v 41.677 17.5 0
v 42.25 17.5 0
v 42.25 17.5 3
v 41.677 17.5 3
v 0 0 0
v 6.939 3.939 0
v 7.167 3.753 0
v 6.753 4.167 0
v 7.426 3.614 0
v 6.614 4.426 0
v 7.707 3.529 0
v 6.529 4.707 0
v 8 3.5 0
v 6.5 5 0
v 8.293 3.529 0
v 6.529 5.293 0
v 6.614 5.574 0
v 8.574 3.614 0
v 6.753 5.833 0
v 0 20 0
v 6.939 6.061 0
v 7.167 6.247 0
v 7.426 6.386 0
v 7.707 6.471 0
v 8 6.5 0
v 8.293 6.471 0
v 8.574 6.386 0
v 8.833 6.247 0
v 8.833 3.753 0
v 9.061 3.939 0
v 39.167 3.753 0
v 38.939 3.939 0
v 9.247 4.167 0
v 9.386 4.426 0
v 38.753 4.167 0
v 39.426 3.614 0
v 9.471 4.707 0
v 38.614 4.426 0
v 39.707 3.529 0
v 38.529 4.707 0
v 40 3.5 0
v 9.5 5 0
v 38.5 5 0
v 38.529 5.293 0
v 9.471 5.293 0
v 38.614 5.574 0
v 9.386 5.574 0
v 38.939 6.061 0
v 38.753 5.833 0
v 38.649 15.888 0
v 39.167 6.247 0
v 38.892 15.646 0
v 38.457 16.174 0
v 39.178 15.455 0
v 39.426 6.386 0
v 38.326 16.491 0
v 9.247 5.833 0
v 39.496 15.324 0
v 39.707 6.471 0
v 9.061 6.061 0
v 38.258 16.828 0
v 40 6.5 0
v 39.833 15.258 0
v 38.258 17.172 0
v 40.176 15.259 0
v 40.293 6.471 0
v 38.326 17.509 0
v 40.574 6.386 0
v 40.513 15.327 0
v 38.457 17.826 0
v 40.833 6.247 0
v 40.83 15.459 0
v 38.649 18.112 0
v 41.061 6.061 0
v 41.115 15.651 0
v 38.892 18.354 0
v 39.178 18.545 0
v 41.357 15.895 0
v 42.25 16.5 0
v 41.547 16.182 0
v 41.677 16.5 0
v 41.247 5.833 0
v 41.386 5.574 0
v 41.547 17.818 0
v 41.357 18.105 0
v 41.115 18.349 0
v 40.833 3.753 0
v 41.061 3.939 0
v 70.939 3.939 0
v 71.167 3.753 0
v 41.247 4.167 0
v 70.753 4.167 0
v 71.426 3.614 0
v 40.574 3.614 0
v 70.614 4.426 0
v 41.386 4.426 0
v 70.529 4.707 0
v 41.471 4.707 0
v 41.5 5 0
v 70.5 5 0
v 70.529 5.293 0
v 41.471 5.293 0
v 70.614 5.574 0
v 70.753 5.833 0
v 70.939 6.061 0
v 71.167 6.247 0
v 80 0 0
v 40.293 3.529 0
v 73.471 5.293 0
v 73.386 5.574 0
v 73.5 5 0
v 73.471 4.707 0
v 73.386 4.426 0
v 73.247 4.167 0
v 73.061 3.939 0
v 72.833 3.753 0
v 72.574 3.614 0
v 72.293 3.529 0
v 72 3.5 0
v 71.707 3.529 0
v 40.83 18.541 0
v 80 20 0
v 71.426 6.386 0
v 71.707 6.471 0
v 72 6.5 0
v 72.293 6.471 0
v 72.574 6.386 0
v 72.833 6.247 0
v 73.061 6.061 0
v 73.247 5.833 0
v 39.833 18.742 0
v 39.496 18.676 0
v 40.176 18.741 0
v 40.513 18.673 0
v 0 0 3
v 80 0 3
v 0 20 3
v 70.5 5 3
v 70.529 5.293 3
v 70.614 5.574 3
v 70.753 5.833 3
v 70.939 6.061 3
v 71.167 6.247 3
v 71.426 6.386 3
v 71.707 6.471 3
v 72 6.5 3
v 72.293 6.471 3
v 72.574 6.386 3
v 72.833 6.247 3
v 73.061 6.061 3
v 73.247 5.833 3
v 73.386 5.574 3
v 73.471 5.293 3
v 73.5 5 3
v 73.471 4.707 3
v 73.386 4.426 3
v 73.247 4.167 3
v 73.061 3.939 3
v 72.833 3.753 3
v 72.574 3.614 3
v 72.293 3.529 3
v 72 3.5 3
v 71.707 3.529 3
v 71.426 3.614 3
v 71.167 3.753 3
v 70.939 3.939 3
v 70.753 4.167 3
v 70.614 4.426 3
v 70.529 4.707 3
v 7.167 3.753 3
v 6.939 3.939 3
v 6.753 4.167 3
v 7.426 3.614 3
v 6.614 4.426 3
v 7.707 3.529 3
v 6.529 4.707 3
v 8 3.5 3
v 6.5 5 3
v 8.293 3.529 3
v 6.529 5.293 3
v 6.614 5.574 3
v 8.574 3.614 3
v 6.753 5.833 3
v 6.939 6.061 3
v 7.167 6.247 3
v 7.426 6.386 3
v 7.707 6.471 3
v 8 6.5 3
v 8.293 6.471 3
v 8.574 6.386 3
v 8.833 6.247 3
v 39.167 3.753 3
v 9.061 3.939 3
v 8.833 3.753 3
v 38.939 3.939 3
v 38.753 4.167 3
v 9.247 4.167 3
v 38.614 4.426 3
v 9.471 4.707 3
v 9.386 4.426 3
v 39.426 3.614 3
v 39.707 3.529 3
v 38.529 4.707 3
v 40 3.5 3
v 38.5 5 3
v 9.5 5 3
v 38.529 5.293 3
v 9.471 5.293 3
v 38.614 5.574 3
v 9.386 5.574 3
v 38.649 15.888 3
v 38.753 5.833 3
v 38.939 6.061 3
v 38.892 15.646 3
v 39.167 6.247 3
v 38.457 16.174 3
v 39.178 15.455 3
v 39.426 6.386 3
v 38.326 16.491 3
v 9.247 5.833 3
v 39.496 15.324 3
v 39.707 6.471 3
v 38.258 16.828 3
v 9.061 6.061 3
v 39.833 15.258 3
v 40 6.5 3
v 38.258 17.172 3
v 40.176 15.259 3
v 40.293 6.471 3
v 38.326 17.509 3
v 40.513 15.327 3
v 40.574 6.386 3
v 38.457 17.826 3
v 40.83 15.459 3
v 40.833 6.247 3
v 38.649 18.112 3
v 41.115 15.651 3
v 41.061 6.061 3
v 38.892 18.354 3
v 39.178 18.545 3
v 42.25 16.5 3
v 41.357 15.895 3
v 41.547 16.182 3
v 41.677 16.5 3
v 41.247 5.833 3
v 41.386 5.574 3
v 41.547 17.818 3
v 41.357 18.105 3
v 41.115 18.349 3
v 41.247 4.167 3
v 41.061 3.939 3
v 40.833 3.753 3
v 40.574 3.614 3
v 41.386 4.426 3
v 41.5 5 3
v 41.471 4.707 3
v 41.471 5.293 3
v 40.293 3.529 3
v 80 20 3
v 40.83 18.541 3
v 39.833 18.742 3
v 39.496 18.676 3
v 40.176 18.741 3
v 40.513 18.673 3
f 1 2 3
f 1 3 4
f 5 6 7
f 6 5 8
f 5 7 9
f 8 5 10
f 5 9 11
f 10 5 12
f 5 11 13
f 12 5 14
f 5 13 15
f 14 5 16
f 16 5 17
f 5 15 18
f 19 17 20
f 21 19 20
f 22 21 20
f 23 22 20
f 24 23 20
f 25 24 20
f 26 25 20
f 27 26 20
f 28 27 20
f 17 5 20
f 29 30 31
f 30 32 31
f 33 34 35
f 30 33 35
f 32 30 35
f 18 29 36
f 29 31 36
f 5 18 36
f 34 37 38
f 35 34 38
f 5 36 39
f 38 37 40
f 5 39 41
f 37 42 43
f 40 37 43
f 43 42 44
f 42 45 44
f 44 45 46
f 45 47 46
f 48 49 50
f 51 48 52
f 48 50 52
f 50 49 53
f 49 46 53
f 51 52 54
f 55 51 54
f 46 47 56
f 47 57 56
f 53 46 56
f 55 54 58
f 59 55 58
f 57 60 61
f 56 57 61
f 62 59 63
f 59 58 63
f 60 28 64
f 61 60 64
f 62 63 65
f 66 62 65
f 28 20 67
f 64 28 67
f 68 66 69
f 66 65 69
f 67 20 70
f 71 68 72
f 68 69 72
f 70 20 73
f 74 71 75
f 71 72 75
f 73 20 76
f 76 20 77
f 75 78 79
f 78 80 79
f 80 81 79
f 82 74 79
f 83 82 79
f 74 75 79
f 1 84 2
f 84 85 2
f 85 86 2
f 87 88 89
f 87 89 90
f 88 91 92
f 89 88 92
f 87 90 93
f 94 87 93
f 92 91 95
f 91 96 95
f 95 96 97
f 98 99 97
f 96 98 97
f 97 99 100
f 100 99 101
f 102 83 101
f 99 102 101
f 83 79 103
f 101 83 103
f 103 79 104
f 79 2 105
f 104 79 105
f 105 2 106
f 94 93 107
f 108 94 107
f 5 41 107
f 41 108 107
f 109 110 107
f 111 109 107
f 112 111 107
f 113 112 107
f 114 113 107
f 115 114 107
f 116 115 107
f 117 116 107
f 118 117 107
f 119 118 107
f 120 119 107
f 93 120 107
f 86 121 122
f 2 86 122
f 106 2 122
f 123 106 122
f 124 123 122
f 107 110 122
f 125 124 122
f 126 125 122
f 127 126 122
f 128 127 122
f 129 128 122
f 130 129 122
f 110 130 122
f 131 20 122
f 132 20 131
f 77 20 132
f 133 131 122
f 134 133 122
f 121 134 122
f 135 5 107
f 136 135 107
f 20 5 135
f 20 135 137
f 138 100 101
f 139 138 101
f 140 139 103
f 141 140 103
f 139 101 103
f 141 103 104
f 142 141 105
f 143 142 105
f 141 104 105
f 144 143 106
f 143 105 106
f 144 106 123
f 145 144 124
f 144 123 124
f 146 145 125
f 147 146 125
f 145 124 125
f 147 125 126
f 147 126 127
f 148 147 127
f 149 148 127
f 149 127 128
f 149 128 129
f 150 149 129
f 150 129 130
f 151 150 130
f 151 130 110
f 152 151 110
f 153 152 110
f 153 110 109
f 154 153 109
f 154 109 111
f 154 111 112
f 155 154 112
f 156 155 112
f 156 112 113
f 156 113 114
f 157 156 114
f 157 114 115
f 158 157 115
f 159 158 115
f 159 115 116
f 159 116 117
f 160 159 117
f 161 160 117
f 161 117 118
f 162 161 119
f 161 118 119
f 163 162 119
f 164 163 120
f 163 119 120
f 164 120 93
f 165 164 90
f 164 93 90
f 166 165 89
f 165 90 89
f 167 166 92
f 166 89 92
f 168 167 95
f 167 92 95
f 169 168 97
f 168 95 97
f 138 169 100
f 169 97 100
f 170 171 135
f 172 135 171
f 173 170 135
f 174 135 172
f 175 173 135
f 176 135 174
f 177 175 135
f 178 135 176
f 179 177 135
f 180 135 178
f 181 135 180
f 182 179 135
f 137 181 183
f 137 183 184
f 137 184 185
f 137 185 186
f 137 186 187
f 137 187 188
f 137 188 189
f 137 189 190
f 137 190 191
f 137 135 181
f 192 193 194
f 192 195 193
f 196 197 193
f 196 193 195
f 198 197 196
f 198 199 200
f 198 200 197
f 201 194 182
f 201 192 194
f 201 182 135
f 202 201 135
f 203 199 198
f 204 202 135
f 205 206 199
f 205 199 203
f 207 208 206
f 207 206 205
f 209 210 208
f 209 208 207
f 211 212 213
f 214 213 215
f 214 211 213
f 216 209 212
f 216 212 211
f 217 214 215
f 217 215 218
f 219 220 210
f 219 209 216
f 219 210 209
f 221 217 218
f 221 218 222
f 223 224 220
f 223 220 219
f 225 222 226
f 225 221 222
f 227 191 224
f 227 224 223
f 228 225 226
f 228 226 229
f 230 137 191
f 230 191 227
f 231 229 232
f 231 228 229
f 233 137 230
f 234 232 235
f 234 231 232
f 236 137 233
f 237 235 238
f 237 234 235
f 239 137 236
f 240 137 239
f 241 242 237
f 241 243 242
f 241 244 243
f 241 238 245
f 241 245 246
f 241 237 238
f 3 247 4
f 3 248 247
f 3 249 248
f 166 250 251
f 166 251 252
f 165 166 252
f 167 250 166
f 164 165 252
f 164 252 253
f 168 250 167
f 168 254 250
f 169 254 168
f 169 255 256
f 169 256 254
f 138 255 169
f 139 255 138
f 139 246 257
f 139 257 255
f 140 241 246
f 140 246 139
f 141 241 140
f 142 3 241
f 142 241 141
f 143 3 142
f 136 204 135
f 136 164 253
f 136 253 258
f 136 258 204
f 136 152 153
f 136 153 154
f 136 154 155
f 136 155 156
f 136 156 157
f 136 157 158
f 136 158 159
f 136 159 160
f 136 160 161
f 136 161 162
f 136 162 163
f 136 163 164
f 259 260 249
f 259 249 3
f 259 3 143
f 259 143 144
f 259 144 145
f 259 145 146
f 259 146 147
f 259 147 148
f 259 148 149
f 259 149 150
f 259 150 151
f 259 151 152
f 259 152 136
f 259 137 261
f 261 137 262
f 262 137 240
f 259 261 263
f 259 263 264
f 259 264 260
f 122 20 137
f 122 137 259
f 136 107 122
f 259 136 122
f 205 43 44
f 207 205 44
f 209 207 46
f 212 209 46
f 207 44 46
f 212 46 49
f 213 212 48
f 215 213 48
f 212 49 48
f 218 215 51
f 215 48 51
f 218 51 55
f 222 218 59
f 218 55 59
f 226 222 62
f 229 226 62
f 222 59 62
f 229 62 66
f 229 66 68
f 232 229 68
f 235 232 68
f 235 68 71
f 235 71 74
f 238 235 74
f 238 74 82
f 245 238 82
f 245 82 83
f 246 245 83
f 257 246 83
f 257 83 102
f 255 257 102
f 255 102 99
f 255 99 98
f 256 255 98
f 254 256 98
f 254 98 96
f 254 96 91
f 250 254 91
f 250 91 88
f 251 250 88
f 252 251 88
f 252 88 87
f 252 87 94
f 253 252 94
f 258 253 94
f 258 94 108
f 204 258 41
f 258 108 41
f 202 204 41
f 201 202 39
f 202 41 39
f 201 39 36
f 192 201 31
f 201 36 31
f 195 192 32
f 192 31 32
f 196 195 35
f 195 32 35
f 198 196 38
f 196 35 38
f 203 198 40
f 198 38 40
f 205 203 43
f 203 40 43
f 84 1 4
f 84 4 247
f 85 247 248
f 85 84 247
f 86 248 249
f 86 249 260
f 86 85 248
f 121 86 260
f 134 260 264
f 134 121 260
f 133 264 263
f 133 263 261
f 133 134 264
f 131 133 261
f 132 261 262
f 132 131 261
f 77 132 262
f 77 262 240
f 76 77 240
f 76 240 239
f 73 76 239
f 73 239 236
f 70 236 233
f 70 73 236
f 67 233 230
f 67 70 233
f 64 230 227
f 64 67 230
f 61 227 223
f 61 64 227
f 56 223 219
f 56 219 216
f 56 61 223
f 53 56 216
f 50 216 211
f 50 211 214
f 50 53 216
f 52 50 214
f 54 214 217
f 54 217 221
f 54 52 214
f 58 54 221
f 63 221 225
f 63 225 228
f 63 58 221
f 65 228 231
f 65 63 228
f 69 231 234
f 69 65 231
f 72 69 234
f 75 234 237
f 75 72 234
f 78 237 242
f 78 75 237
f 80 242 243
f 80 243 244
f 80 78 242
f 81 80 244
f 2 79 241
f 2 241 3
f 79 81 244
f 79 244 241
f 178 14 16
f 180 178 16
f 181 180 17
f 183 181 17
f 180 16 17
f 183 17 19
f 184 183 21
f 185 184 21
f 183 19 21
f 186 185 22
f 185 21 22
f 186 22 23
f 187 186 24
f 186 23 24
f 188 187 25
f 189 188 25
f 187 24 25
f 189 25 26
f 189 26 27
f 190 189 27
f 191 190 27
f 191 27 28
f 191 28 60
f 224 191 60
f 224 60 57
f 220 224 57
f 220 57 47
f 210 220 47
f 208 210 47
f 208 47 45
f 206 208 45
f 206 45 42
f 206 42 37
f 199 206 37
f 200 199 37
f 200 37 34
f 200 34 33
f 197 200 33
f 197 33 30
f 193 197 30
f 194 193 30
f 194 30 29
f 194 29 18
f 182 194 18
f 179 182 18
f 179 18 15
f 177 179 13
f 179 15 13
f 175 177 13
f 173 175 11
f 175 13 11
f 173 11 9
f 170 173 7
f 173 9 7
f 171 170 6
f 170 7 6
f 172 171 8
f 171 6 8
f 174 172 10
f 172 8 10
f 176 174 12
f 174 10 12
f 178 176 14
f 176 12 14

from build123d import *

# Parameters (mm, degrees)
SKETCH1_W           = 80
SKETCH1_H           = 20
BOSS_EXTRUDE1_DEPTH = 3
SKETCH2_R           = 1.5
CUT_EXTRUDE1_DEPTH  = 6
CUT_EXTRUDE2_DEPTH  = 3


with BuildPart() as part:
    # Sketch1 → Boss-Extrude1 (new body)
    with BuildSketch(Plane.XY):
        with Locations((40, 10)):
            Rectangle(SKETCH1_W, SKETCH1_H)
    extrude(amount=BOSS_EXTRUDE1_DEPTH)

    # Sketch2 → Cut-Extrude1 (cut)
    with BuildSketch(Plane(origin=(88.772654641, -6.468882819, 0), x_dir=(-1, 0, 0), z_dir=(0, 0, -1))):
        with Locations((16.772654641, 11.468882819)):
            Circle(SKETCH2_R)
        with Locations((48.772654641, 11.468882819)):
            Circle(SKETCH2_R)
        with Locations((80.772654641, 11.468882819)):
            Circle(SKETCH2_R)
    extrude(amount=-CUT_EXTRUDE1_DEPTH, mode=Mode.SUBTRACT)

    # Sketch3 → Cut-Extrude2 (cut)
    with BuildSketch(Plane(origin=(88.772654641, -6.468882819, 0), x_dir=(-1, 0, 0), z_dir=(0, 0, -1))):
        with BuildLine():
            Line((46.522654641, 23.968882819), (47.095603657, 23.968882819))
            ThreePointArc((47.095603657, 23.968882819), (50.522654641, 23.468882819), (47.095603657, 22.968882819))
            Line((47.095603657, 22.968882819), (46.522654641, 22.968882819))
            Line((46.522654641, 22.968882819), (46.522654641, 23.968882819))
        make_face()
    extrude(amount=-CUT_EXTRUDE2_DEPTH, mode=Mode.SUBTRACT)


solid = part.part
